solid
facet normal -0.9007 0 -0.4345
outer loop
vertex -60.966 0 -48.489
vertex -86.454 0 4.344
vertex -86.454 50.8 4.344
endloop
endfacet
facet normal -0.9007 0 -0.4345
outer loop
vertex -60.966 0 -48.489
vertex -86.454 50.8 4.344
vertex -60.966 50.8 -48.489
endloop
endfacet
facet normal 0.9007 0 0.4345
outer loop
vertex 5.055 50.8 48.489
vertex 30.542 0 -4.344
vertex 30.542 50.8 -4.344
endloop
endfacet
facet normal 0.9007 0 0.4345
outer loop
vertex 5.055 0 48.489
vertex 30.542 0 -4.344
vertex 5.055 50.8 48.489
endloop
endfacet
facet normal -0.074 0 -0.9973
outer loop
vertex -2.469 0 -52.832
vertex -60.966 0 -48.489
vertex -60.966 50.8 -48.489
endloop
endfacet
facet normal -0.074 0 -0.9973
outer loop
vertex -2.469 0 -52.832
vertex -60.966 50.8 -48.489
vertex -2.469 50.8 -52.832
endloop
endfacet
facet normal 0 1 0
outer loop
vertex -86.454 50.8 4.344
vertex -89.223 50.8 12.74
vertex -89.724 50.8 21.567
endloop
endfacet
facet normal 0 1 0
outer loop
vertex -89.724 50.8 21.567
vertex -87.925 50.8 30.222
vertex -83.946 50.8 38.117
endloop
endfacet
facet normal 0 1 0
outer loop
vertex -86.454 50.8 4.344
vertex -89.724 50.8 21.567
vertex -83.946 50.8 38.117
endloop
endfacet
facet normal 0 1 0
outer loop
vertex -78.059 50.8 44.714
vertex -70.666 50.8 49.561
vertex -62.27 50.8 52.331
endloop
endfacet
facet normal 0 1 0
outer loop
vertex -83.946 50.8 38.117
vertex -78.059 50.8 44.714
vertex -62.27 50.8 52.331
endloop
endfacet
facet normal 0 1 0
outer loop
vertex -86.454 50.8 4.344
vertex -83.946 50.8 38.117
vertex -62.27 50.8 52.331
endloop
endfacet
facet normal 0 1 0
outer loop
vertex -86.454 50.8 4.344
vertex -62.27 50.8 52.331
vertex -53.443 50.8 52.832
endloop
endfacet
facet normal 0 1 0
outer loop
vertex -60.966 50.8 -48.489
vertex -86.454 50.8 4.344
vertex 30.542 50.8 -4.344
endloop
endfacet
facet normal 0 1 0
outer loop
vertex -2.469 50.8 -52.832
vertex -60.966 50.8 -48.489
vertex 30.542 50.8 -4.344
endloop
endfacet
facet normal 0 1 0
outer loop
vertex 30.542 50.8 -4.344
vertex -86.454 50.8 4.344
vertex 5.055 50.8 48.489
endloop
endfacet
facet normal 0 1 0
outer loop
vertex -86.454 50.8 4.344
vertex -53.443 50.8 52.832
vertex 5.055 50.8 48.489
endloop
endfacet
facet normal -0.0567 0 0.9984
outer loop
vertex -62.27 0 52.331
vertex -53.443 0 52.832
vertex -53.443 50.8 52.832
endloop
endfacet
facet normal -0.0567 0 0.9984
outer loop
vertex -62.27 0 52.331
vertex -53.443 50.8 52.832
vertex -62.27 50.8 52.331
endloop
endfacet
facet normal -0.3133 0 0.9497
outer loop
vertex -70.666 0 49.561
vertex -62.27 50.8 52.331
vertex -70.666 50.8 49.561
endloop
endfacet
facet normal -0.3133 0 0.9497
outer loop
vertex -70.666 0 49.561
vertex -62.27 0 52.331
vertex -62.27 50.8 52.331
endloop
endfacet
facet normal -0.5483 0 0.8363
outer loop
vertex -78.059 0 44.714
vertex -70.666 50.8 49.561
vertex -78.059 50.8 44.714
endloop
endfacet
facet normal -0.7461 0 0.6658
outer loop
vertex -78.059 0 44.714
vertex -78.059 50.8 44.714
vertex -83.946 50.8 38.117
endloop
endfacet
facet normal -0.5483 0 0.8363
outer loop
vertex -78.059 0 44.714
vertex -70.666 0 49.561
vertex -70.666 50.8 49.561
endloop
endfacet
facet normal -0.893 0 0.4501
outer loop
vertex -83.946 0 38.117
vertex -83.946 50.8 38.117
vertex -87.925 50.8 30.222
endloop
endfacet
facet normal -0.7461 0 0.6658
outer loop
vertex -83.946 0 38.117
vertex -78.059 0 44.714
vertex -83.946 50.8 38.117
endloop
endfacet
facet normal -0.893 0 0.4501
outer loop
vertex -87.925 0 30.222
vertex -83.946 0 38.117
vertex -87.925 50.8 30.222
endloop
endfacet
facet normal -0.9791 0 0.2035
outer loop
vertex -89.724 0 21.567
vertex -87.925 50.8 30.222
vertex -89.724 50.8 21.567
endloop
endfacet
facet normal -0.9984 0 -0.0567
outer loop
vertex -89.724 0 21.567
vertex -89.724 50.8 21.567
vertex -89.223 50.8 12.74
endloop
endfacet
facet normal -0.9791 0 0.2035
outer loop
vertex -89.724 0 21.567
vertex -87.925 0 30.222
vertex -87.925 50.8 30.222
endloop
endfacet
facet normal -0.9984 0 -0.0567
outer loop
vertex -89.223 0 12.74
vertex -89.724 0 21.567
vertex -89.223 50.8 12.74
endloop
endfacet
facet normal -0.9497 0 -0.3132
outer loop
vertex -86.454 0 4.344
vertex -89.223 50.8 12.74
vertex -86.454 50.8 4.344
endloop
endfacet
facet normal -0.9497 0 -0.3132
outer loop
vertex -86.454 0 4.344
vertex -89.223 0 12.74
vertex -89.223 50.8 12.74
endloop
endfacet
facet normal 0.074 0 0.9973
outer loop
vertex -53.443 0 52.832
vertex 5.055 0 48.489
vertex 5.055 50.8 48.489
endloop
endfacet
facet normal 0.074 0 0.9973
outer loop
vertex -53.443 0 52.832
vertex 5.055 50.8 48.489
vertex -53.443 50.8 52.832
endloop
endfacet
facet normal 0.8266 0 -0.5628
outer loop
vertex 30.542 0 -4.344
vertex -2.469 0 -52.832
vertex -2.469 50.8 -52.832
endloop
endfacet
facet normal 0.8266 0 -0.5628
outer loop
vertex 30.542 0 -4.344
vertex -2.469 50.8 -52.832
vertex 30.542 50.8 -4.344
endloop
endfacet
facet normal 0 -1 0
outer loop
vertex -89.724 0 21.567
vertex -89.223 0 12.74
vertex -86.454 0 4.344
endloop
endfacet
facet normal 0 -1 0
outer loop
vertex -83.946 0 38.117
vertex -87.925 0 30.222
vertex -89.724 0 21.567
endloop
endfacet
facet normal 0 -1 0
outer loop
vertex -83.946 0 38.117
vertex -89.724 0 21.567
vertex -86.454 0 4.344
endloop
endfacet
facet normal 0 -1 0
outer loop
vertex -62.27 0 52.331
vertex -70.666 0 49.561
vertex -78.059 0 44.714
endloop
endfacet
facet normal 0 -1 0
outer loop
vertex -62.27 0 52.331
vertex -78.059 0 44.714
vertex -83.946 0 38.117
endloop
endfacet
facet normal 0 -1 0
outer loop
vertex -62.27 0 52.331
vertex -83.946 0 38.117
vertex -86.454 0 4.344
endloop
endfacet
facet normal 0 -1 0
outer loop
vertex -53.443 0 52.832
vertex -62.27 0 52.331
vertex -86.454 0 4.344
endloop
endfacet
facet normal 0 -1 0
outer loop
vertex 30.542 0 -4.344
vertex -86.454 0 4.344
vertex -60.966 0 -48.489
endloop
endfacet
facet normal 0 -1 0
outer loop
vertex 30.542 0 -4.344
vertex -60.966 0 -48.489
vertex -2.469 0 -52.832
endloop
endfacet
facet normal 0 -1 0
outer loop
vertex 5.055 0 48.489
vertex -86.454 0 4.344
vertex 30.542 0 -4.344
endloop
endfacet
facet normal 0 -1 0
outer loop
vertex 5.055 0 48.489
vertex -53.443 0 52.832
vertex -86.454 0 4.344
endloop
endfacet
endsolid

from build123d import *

# Parameters (mm, degrees)
F1_DEPTH = 50.8


with BuildPart() as f1:
    # F0 (on Front) → F1 (new body)
    with BuildSketch(Plane.XZ):
        with BuildLine():
            Line((-86.453595, 4.343704), (-60.966483, -48.488677))
            Line((-60.966483, -48.488677), (-2.468743, -52.832381))
            Line((-2.468743, -52.832381), (30.541885, -4.343704))
            Line((30.541885, -4.343704), (5.054773, 48.488677))
            Line((5.054773, 48.488677), (-53.442967, 52.832381))
            ThreePointArc((-53.442967, 52.832381), (-83.945756, 38.11739), (-86.453595, 4.343704))
        make_face()
    extrude(amount=-F1_DEPTH)


solid = f1.part
